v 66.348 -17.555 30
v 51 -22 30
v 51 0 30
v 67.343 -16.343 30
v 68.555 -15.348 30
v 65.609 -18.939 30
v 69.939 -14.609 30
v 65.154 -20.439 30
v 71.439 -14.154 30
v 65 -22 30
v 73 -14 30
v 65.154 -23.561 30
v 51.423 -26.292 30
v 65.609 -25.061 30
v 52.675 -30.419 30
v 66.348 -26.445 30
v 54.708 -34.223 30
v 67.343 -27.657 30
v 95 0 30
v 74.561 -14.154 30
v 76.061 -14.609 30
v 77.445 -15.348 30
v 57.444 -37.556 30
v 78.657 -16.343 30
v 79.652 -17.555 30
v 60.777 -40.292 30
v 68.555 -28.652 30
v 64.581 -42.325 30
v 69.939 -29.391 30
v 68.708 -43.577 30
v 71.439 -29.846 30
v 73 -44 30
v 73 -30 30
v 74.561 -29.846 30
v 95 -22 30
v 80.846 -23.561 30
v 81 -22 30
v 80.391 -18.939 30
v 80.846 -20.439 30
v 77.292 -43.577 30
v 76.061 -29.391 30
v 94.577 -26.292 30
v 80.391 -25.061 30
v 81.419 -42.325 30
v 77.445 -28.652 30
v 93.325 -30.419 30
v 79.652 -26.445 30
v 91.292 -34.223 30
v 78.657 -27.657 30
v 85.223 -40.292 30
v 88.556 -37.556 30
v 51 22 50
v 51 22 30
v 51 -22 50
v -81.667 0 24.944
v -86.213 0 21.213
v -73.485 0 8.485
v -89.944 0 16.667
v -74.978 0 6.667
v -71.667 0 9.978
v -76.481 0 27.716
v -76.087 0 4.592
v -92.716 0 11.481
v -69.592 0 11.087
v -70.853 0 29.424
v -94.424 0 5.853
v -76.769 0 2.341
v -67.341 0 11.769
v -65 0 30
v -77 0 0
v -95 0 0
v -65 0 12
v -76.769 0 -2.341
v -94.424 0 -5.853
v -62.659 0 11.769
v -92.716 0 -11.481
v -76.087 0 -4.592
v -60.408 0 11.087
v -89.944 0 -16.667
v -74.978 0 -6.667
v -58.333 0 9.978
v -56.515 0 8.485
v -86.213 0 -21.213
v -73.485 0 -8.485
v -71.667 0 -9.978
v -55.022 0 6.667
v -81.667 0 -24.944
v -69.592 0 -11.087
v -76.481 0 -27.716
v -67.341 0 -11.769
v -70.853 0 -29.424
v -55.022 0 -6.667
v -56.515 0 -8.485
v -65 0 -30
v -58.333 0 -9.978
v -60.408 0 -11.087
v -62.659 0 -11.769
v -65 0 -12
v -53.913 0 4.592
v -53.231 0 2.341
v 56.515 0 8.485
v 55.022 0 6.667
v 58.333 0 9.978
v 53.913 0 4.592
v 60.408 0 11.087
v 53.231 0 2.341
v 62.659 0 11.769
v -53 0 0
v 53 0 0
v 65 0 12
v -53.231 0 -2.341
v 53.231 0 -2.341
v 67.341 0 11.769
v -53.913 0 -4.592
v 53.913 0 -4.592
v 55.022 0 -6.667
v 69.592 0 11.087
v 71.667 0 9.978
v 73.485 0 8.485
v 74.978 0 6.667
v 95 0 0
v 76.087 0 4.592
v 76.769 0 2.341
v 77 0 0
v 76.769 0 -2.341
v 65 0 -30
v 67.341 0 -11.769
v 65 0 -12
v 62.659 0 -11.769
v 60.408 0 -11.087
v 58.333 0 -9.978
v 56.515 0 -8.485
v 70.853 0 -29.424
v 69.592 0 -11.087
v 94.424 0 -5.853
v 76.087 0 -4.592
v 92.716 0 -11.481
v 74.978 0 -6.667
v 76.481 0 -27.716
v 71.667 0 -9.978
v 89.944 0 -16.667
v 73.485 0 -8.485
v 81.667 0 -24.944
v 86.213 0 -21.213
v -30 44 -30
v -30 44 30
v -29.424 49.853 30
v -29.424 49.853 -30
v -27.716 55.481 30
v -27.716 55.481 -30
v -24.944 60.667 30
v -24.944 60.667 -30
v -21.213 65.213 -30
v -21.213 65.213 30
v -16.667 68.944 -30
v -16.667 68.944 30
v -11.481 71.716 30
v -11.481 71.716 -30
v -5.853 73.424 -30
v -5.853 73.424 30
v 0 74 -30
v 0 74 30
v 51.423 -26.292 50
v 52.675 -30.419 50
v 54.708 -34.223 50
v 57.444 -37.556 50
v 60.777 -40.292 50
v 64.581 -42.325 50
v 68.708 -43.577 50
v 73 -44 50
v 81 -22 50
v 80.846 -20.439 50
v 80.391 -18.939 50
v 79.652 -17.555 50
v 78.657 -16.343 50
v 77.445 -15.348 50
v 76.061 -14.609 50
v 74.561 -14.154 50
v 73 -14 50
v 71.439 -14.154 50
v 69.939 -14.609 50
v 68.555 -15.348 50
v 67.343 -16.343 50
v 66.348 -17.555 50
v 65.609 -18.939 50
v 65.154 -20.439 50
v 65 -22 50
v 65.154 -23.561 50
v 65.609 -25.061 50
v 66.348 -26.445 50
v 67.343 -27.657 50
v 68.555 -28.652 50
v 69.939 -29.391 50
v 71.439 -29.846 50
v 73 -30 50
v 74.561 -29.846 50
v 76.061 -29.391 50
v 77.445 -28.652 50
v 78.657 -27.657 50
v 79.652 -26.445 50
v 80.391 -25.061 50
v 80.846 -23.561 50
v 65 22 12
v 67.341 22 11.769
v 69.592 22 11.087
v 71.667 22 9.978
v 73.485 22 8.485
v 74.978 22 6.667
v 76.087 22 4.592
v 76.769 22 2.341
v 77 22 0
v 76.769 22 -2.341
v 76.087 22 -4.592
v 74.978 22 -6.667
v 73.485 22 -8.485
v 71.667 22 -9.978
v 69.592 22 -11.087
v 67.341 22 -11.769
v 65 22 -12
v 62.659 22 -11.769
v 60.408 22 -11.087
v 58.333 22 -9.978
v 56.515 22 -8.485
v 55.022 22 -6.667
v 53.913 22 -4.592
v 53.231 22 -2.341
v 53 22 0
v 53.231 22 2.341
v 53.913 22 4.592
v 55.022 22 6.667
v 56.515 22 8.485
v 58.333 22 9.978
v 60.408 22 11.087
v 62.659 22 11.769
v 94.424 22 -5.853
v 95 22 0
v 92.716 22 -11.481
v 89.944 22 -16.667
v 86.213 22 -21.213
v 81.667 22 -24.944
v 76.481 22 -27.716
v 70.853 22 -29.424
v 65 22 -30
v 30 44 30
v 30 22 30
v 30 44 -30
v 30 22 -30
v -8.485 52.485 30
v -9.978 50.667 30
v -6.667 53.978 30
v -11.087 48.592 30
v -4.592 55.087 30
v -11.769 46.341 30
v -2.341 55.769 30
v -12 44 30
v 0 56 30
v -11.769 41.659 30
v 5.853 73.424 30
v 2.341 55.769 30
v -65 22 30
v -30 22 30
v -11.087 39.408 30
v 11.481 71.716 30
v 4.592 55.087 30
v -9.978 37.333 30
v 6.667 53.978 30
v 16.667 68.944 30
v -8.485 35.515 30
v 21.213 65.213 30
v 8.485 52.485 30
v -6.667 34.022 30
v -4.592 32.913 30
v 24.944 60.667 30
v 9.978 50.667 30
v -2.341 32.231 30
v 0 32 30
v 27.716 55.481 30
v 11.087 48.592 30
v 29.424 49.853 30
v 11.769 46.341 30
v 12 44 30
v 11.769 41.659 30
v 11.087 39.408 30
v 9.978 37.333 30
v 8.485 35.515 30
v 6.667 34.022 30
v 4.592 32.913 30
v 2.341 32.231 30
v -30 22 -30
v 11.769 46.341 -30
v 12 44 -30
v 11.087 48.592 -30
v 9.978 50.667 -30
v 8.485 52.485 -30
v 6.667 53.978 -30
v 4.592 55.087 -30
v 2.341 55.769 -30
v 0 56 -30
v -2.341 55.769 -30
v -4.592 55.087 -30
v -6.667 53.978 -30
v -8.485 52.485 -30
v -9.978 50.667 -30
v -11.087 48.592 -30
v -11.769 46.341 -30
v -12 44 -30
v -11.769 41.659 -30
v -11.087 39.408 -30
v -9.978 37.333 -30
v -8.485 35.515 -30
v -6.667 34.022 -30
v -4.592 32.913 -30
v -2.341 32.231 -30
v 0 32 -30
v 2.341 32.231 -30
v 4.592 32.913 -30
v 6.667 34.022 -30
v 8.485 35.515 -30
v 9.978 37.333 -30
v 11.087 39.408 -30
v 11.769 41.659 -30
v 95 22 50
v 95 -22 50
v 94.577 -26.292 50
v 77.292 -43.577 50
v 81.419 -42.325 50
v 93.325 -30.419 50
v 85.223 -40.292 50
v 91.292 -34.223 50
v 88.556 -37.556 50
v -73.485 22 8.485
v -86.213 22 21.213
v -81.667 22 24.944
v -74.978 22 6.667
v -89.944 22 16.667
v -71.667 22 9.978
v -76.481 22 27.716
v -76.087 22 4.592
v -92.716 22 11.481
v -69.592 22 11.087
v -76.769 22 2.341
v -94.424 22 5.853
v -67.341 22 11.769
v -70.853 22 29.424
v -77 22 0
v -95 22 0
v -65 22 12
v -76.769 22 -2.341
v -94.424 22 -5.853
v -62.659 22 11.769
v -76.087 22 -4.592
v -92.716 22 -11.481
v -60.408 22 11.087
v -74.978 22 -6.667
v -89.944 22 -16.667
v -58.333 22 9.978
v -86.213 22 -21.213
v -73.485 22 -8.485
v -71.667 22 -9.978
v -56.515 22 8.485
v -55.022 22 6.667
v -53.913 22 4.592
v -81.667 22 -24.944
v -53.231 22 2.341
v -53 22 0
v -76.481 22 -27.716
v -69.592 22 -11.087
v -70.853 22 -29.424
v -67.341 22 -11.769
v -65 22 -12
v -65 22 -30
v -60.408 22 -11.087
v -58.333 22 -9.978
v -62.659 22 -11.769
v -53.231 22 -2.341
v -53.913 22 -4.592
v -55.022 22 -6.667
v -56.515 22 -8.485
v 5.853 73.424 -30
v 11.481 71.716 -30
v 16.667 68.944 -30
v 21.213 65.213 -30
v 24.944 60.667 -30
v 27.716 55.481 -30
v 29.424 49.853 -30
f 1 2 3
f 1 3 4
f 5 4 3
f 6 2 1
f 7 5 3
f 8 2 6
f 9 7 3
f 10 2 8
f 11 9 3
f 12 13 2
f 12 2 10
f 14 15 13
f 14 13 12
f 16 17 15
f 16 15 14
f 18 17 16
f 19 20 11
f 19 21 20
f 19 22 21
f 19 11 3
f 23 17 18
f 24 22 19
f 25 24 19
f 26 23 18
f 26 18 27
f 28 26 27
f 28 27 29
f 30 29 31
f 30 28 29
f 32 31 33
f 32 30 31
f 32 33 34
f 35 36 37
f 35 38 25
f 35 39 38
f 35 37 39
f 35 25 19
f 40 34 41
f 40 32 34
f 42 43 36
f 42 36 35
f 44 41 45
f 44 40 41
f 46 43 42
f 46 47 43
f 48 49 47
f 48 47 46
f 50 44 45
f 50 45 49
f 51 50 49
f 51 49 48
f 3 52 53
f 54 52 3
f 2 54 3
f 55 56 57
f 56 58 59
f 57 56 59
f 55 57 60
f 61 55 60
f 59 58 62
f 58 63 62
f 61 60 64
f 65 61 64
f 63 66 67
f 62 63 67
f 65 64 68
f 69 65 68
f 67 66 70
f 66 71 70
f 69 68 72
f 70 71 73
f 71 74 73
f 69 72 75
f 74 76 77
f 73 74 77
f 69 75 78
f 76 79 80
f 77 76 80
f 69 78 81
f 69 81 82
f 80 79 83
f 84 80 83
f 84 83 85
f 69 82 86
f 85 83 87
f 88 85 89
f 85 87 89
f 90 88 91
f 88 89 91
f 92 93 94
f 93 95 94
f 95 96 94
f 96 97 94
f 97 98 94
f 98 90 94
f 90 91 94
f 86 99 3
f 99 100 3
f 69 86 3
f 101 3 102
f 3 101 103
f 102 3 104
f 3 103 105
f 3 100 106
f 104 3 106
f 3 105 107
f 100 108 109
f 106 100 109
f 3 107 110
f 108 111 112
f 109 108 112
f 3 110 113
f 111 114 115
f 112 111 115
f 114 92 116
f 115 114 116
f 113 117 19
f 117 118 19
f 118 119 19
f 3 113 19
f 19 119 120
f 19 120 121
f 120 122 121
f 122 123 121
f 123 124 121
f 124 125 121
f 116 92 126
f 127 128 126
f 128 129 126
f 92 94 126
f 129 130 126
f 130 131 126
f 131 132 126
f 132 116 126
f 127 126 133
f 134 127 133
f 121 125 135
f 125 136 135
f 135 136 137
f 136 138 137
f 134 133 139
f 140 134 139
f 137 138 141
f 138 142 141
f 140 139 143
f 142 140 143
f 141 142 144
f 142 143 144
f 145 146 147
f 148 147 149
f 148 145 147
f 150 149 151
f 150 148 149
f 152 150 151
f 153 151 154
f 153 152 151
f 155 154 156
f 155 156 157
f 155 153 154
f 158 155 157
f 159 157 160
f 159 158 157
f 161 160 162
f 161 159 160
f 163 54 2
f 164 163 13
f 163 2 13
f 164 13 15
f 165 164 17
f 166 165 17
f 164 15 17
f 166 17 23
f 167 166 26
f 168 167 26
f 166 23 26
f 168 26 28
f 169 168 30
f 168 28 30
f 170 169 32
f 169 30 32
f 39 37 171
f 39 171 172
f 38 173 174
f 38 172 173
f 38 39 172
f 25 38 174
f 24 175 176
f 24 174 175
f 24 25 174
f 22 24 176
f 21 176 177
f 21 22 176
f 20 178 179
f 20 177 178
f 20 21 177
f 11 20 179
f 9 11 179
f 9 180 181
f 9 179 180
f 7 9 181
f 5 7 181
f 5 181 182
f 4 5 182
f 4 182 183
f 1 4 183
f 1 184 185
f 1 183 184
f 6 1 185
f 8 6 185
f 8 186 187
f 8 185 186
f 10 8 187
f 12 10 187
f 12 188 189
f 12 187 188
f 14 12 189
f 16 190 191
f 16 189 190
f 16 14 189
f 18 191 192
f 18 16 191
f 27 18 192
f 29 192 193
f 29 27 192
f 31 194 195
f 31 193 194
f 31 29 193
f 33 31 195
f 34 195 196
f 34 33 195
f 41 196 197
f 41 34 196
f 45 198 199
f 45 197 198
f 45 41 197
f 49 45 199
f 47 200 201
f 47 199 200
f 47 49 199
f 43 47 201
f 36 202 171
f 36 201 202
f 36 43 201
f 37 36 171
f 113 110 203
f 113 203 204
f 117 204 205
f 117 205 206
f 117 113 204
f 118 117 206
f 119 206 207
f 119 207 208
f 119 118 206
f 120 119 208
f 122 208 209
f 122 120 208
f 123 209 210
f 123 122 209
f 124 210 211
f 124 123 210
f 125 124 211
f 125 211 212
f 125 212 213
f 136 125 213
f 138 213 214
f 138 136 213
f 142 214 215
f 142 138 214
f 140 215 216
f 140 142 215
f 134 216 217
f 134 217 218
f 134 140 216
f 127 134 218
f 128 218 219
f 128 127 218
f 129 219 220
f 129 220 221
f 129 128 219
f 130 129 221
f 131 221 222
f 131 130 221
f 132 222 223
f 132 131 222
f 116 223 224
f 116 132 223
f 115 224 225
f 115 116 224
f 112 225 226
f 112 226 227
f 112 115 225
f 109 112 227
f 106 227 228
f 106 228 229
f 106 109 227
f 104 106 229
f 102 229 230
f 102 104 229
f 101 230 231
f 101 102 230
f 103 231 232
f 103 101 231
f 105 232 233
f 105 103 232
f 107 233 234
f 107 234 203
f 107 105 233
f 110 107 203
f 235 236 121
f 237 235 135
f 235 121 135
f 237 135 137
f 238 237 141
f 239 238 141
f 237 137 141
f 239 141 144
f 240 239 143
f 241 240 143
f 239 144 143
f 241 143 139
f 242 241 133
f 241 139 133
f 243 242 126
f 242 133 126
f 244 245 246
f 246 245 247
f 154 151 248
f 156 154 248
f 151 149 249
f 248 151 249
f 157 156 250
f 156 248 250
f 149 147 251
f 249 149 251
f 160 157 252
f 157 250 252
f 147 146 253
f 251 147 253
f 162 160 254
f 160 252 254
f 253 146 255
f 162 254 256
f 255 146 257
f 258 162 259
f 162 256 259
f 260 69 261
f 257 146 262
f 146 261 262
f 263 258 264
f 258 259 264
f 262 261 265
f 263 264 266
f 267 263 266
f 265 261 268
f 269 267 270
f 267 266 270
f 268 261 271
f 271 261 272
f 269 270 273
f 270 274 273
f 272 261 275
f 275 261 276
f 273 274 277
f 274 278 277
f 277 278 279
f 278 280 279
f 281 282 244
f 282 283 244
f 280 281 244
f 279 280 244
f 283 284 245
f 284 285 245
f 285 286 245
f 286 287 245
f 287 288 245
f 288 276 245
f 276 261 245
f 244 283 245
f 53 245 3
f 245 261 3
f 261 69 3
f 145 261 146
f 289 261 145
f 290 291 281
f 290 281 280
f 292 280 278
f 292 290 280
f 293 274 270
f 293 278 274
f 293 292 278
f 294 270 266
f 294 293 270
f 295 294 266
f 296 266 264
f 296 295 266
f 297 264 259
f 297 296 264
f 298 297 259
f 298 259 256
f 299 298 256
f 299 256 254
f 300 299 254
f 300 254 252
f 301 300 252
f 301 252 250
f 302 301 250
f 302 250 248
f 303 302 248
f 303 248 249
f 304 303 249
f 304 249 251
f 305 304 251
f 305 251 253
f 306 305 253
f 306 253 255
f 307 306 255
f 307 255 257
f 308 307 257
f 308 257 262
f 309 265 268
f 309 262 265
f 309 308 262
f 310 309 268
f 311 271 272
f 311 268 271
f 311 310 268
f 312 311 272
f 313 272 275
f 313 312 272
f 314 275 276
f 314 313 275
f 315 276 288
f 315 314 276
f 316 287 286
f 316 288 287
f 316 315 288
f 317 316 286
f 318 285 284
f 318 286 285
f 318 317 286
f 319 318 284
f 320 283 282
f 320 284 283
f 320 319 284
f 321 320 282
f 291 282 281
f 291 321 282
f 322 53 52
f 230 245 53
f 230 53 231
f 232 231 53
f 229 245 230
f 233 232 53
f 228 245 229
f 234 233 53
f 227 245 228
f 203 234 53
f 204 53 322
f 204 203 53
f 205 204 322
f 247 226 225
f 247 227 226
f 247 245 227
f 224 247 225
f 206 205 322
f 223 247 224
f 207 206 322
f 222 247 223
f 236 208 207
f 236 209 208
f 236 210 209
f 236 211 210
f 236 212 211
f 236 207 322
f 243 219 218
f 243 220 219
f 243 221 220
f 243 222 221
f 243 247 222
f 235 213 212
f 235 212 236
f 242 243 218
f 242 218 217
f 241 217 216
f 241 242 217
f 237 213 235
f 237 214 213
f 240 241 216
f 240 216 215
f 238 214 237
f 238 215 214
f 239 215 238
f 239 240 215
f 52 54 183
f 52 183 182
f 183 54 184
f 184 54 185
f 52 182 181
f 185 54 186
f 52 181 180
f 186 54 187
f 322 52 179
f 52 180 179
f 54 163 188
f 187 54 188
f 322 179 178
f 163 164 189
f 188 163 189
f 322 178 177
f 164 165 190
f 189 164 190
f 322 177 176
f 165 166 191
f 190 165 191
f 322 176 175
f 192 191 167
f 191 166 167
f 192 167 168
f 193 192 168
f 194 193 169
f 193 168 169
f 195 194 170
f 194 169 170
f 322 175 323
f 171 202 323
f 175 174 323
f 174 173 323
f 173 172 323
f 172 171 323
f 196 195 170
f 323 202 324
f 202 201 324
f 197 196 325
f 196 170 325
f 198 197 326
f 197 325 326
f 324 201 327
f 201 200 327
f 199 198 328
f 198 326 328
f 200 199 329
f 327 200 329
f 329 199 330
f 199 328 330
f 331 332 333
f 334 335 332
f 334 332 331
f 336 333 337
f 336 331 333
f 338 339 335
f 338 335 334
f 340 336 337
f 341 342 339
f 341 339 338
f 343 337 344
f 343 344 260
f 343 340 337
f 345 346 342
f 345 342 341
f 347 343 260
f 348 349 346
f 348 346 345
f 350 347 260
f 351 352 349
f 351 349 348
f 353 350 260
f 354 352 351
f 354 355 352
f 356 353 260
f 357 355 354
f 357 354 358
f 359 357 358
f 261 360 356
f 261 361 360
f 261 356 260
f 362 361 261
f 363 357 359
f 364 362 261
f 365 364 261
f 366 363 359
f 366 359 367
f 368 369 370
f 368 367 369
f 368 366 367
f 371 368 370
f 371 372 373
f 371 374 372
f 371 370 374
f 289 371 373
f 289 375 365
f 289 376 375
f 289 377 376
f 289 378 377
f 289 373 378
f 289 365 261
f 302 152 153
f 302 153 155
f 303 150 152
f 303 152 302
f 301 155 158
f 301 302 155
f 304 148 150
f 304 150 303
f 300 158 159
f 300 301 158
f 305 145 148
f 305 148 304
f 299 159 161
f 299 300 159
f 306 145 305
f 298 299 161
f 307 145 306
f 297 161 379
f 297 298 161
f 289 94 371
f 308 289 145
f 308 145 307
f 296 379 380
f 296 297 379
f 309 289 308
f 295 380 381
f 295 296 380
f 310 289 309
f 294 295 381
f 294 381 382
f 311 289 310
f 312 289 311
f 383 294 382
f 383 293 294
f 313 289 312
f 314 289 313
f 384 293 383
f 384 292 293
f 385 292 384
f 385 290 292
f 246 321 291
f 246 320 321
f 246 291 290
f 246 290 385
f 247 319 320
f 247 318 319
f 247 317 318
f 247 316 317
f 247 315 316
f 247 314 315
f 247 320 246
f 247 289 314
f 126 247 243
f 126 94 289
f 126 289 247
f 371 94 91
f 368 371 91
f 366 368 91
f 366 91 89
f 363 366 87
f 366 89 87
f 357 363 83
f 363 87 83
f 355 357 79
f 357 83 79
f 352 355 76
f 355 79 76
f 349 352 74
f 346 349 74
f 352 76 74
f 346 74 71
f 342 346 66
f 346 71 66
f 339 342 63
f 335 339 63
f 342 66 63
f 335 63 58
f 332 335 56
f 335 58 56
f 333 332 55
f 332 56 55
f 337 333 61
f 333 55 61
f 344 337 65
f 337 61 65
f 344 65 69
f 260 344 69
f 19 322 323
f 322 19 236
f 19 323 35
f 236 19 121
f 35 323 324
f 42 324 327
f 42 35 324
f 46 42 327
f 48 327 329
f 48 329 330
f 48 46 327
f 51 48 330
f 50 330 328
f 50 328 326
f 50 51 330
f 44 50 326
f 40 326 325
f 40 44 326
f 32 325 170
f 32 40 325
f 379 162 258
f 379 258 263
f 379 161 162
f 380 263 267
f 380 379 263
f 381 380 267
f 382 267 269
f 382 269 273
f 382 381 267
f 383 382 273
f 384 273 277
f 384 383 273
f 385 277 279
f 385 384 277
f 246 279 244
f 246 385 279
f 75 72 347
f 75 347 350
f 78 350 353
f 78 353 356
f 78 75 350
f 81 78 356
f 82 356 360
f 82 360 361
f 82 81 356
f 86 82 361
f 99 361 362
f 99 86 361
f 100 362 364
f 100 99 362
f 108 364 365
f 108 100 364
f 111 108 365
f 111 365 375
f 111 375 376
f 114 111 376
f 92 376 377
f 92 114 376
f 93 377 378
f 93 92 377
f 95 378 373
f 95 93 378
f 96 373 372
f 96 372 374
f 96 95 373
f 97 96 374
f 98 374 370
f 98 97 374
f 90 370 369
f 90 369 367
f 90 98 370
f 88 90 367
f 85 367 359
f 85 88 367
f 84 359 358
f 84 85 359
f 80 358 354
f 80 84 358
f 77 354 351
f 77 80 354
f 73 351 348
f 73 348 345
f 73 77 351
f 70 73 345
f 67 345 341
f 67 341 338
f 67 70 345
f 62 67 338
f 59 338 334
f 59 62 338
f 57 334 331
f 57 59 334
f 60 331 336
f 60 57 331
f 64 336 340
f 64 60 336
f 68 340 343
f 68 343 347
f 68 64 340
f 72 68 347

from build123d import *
from OCP.BRepFilletAPI import BRepFilletAPI_MakeFillet

# Parameters (mm, degrees)
SKETCH1_R                = 12
BOSS_EXTRUDE1_DEPTH      = 22
BOSS_EXTRUDE1_2_DEPTH    = 22
SKETCH1_3_W              = 60
SKETCH1_3_H              = 60
BOSS_EXTRUDE2_DEPTH      = 74
BOSS_EXTRUDE3_DEPTH      = 22
BOSS_EXTRUDE3_DEPTH_BACK = 44
SKETCH1_4_W              = 44
SKETCH1_4_H              = 20
FILLET1_R                = 30
FILLET1_R_2              = 22
CUT_EXTRUDE1_DEPTH       = 131.387882873
CUT_EXTRUDE1_DEPTH_BACK  = 131.387882873
SKETCH2_R                = 12
SKETCH2_R_2              = 8


with BuildPart() as part:
    # Sketch1 → Boss-Extrude1 (new body)
    with BuildSketch(Plane(origin=(0, 0, 0), x_dir=(1, 0, 0), z_dir=(0, 1, 0))):
        with BuildLine():
            Line((-65, -30), (-30, -30))
            Line((-30, -30), (-30, 30))
            Line((-30, 30), (-65, 30))
            ThreePointArc((-65, 30), (-95, 0), (-65, -30))
        make_face()
        with Locations(Location((-65, 0, 0), (0, 0, 270))):
            Circle(SKETCH1_R, mode=Mode.SUBTRACT)
    extrude(amount=BOSS_EXTRUDE1_DEPTH)



with BuildPart() as body_2:
    # Sketch1 → Boss-Extrude1 2 (new body)
    with BuildSketch(Plane(origin=(0, 0, 0), x_dir=(1, 0, 0), z_dir=(0, 1, 0))):
        with BuildLine():
            Line((51, -30), (95, -30))
            Line((95, -30), (95, 0))
            ThreePointArc((95, 0), (86.213203436, 21.213203436), (65, 30))
            Line((65, 30), (30, 30))
            Line((30, 30), (30, -30))
            Line((30, -30), (51, -30))
        make_face()
        with Locations(Location((65, 0, 0), (0, 0, 270))):
            Circle(SKETCH1_R, mode=Mode.SUBTRACT)
    extrude(amount=BOSS_EXTRUDE1_2_DEPTH)


with BuildPart() as part_1:
    add(part.part)

    add(body_2.part)  # Boss-Extrude2 merges body 2
    # Sketch1<3> → Boss-Extrude2 (add)
    with BuildSketch(Plane(origin=(0, 0, 0), x_dir=(1, 0, 0), z_dir=(0, 1, 0))):
        Rectangle(SKETCH1_3_W, SKETCH1_3_H)
    extrude(amount=BOSS_EXTRUDE2_DEPTH)

    # Sketch1<4> → Boss-Extrude3 (add, two sides: drawn at the far end of the back side and taken through both)
    with BuildSketch(Plane(origin=(0, 0, 0), x_dir=(1, 0, 0), z_dir=(0, 1, 0)).offset(-BOSS_EXTRUDE3_DEPTH_BACK)):
        with Locations((73, -40)):
            Rectangle(SKETCH1_4_W, SKETCH1_4_H)
    extrude(amount=BOSS_EXTRUDE3_DEPTH + BOSS_EXTRUDE3_DEPTH_BACK)

    # Fillet1
    fillet1_edges_1 = [part_1.edges().sort_by_distance(p)[0] for p in [
        (30, 74, 0),
        (-30, 74, 0),
    ]]
    fillet1_edges_2 = [part_1.edges().sort_by_distance(p)[0] for p in [
        (95, -44, 40),
        (51, -44, 40),
    ]]
    fillet1 = BRepFilletAPI_MakeFillet(part_1.part.solid().wrapped)
    for e in fillet1_edges_1:
        fillet1.Add(FILLET1_R - 0.0001, e.wrapped)
    for e in fillet1_edges_2:
        fillet1.Add(FILLET1_R_2 - 0.0001, e.wrapped)
    add(Compound.cast(fillet1.Shape()), mode=Mode.REPLACE)  # a hair under: the kernel refuses the full size

    # Sketch2 → Cut-Extrude1 (cut, two sides: drawn at the far end of the back side and taken through both)
    with BuildSketch(Plane.XY.offset(-CUT_EXTRUDE1_DEPTH_BACK)):
        with Locations((0, 44)):
            Circle(SKETCH2_R)
        with Locations((73, -22)):
            Circle(SKETCH2_R_2)
    extrude(amount=CUT_EXTRUDE1_DEPTH + CUT_EXTRUDE1_DEPTH_BACK, mode=Mode.SUBTRACT)


solid = part_1.part
